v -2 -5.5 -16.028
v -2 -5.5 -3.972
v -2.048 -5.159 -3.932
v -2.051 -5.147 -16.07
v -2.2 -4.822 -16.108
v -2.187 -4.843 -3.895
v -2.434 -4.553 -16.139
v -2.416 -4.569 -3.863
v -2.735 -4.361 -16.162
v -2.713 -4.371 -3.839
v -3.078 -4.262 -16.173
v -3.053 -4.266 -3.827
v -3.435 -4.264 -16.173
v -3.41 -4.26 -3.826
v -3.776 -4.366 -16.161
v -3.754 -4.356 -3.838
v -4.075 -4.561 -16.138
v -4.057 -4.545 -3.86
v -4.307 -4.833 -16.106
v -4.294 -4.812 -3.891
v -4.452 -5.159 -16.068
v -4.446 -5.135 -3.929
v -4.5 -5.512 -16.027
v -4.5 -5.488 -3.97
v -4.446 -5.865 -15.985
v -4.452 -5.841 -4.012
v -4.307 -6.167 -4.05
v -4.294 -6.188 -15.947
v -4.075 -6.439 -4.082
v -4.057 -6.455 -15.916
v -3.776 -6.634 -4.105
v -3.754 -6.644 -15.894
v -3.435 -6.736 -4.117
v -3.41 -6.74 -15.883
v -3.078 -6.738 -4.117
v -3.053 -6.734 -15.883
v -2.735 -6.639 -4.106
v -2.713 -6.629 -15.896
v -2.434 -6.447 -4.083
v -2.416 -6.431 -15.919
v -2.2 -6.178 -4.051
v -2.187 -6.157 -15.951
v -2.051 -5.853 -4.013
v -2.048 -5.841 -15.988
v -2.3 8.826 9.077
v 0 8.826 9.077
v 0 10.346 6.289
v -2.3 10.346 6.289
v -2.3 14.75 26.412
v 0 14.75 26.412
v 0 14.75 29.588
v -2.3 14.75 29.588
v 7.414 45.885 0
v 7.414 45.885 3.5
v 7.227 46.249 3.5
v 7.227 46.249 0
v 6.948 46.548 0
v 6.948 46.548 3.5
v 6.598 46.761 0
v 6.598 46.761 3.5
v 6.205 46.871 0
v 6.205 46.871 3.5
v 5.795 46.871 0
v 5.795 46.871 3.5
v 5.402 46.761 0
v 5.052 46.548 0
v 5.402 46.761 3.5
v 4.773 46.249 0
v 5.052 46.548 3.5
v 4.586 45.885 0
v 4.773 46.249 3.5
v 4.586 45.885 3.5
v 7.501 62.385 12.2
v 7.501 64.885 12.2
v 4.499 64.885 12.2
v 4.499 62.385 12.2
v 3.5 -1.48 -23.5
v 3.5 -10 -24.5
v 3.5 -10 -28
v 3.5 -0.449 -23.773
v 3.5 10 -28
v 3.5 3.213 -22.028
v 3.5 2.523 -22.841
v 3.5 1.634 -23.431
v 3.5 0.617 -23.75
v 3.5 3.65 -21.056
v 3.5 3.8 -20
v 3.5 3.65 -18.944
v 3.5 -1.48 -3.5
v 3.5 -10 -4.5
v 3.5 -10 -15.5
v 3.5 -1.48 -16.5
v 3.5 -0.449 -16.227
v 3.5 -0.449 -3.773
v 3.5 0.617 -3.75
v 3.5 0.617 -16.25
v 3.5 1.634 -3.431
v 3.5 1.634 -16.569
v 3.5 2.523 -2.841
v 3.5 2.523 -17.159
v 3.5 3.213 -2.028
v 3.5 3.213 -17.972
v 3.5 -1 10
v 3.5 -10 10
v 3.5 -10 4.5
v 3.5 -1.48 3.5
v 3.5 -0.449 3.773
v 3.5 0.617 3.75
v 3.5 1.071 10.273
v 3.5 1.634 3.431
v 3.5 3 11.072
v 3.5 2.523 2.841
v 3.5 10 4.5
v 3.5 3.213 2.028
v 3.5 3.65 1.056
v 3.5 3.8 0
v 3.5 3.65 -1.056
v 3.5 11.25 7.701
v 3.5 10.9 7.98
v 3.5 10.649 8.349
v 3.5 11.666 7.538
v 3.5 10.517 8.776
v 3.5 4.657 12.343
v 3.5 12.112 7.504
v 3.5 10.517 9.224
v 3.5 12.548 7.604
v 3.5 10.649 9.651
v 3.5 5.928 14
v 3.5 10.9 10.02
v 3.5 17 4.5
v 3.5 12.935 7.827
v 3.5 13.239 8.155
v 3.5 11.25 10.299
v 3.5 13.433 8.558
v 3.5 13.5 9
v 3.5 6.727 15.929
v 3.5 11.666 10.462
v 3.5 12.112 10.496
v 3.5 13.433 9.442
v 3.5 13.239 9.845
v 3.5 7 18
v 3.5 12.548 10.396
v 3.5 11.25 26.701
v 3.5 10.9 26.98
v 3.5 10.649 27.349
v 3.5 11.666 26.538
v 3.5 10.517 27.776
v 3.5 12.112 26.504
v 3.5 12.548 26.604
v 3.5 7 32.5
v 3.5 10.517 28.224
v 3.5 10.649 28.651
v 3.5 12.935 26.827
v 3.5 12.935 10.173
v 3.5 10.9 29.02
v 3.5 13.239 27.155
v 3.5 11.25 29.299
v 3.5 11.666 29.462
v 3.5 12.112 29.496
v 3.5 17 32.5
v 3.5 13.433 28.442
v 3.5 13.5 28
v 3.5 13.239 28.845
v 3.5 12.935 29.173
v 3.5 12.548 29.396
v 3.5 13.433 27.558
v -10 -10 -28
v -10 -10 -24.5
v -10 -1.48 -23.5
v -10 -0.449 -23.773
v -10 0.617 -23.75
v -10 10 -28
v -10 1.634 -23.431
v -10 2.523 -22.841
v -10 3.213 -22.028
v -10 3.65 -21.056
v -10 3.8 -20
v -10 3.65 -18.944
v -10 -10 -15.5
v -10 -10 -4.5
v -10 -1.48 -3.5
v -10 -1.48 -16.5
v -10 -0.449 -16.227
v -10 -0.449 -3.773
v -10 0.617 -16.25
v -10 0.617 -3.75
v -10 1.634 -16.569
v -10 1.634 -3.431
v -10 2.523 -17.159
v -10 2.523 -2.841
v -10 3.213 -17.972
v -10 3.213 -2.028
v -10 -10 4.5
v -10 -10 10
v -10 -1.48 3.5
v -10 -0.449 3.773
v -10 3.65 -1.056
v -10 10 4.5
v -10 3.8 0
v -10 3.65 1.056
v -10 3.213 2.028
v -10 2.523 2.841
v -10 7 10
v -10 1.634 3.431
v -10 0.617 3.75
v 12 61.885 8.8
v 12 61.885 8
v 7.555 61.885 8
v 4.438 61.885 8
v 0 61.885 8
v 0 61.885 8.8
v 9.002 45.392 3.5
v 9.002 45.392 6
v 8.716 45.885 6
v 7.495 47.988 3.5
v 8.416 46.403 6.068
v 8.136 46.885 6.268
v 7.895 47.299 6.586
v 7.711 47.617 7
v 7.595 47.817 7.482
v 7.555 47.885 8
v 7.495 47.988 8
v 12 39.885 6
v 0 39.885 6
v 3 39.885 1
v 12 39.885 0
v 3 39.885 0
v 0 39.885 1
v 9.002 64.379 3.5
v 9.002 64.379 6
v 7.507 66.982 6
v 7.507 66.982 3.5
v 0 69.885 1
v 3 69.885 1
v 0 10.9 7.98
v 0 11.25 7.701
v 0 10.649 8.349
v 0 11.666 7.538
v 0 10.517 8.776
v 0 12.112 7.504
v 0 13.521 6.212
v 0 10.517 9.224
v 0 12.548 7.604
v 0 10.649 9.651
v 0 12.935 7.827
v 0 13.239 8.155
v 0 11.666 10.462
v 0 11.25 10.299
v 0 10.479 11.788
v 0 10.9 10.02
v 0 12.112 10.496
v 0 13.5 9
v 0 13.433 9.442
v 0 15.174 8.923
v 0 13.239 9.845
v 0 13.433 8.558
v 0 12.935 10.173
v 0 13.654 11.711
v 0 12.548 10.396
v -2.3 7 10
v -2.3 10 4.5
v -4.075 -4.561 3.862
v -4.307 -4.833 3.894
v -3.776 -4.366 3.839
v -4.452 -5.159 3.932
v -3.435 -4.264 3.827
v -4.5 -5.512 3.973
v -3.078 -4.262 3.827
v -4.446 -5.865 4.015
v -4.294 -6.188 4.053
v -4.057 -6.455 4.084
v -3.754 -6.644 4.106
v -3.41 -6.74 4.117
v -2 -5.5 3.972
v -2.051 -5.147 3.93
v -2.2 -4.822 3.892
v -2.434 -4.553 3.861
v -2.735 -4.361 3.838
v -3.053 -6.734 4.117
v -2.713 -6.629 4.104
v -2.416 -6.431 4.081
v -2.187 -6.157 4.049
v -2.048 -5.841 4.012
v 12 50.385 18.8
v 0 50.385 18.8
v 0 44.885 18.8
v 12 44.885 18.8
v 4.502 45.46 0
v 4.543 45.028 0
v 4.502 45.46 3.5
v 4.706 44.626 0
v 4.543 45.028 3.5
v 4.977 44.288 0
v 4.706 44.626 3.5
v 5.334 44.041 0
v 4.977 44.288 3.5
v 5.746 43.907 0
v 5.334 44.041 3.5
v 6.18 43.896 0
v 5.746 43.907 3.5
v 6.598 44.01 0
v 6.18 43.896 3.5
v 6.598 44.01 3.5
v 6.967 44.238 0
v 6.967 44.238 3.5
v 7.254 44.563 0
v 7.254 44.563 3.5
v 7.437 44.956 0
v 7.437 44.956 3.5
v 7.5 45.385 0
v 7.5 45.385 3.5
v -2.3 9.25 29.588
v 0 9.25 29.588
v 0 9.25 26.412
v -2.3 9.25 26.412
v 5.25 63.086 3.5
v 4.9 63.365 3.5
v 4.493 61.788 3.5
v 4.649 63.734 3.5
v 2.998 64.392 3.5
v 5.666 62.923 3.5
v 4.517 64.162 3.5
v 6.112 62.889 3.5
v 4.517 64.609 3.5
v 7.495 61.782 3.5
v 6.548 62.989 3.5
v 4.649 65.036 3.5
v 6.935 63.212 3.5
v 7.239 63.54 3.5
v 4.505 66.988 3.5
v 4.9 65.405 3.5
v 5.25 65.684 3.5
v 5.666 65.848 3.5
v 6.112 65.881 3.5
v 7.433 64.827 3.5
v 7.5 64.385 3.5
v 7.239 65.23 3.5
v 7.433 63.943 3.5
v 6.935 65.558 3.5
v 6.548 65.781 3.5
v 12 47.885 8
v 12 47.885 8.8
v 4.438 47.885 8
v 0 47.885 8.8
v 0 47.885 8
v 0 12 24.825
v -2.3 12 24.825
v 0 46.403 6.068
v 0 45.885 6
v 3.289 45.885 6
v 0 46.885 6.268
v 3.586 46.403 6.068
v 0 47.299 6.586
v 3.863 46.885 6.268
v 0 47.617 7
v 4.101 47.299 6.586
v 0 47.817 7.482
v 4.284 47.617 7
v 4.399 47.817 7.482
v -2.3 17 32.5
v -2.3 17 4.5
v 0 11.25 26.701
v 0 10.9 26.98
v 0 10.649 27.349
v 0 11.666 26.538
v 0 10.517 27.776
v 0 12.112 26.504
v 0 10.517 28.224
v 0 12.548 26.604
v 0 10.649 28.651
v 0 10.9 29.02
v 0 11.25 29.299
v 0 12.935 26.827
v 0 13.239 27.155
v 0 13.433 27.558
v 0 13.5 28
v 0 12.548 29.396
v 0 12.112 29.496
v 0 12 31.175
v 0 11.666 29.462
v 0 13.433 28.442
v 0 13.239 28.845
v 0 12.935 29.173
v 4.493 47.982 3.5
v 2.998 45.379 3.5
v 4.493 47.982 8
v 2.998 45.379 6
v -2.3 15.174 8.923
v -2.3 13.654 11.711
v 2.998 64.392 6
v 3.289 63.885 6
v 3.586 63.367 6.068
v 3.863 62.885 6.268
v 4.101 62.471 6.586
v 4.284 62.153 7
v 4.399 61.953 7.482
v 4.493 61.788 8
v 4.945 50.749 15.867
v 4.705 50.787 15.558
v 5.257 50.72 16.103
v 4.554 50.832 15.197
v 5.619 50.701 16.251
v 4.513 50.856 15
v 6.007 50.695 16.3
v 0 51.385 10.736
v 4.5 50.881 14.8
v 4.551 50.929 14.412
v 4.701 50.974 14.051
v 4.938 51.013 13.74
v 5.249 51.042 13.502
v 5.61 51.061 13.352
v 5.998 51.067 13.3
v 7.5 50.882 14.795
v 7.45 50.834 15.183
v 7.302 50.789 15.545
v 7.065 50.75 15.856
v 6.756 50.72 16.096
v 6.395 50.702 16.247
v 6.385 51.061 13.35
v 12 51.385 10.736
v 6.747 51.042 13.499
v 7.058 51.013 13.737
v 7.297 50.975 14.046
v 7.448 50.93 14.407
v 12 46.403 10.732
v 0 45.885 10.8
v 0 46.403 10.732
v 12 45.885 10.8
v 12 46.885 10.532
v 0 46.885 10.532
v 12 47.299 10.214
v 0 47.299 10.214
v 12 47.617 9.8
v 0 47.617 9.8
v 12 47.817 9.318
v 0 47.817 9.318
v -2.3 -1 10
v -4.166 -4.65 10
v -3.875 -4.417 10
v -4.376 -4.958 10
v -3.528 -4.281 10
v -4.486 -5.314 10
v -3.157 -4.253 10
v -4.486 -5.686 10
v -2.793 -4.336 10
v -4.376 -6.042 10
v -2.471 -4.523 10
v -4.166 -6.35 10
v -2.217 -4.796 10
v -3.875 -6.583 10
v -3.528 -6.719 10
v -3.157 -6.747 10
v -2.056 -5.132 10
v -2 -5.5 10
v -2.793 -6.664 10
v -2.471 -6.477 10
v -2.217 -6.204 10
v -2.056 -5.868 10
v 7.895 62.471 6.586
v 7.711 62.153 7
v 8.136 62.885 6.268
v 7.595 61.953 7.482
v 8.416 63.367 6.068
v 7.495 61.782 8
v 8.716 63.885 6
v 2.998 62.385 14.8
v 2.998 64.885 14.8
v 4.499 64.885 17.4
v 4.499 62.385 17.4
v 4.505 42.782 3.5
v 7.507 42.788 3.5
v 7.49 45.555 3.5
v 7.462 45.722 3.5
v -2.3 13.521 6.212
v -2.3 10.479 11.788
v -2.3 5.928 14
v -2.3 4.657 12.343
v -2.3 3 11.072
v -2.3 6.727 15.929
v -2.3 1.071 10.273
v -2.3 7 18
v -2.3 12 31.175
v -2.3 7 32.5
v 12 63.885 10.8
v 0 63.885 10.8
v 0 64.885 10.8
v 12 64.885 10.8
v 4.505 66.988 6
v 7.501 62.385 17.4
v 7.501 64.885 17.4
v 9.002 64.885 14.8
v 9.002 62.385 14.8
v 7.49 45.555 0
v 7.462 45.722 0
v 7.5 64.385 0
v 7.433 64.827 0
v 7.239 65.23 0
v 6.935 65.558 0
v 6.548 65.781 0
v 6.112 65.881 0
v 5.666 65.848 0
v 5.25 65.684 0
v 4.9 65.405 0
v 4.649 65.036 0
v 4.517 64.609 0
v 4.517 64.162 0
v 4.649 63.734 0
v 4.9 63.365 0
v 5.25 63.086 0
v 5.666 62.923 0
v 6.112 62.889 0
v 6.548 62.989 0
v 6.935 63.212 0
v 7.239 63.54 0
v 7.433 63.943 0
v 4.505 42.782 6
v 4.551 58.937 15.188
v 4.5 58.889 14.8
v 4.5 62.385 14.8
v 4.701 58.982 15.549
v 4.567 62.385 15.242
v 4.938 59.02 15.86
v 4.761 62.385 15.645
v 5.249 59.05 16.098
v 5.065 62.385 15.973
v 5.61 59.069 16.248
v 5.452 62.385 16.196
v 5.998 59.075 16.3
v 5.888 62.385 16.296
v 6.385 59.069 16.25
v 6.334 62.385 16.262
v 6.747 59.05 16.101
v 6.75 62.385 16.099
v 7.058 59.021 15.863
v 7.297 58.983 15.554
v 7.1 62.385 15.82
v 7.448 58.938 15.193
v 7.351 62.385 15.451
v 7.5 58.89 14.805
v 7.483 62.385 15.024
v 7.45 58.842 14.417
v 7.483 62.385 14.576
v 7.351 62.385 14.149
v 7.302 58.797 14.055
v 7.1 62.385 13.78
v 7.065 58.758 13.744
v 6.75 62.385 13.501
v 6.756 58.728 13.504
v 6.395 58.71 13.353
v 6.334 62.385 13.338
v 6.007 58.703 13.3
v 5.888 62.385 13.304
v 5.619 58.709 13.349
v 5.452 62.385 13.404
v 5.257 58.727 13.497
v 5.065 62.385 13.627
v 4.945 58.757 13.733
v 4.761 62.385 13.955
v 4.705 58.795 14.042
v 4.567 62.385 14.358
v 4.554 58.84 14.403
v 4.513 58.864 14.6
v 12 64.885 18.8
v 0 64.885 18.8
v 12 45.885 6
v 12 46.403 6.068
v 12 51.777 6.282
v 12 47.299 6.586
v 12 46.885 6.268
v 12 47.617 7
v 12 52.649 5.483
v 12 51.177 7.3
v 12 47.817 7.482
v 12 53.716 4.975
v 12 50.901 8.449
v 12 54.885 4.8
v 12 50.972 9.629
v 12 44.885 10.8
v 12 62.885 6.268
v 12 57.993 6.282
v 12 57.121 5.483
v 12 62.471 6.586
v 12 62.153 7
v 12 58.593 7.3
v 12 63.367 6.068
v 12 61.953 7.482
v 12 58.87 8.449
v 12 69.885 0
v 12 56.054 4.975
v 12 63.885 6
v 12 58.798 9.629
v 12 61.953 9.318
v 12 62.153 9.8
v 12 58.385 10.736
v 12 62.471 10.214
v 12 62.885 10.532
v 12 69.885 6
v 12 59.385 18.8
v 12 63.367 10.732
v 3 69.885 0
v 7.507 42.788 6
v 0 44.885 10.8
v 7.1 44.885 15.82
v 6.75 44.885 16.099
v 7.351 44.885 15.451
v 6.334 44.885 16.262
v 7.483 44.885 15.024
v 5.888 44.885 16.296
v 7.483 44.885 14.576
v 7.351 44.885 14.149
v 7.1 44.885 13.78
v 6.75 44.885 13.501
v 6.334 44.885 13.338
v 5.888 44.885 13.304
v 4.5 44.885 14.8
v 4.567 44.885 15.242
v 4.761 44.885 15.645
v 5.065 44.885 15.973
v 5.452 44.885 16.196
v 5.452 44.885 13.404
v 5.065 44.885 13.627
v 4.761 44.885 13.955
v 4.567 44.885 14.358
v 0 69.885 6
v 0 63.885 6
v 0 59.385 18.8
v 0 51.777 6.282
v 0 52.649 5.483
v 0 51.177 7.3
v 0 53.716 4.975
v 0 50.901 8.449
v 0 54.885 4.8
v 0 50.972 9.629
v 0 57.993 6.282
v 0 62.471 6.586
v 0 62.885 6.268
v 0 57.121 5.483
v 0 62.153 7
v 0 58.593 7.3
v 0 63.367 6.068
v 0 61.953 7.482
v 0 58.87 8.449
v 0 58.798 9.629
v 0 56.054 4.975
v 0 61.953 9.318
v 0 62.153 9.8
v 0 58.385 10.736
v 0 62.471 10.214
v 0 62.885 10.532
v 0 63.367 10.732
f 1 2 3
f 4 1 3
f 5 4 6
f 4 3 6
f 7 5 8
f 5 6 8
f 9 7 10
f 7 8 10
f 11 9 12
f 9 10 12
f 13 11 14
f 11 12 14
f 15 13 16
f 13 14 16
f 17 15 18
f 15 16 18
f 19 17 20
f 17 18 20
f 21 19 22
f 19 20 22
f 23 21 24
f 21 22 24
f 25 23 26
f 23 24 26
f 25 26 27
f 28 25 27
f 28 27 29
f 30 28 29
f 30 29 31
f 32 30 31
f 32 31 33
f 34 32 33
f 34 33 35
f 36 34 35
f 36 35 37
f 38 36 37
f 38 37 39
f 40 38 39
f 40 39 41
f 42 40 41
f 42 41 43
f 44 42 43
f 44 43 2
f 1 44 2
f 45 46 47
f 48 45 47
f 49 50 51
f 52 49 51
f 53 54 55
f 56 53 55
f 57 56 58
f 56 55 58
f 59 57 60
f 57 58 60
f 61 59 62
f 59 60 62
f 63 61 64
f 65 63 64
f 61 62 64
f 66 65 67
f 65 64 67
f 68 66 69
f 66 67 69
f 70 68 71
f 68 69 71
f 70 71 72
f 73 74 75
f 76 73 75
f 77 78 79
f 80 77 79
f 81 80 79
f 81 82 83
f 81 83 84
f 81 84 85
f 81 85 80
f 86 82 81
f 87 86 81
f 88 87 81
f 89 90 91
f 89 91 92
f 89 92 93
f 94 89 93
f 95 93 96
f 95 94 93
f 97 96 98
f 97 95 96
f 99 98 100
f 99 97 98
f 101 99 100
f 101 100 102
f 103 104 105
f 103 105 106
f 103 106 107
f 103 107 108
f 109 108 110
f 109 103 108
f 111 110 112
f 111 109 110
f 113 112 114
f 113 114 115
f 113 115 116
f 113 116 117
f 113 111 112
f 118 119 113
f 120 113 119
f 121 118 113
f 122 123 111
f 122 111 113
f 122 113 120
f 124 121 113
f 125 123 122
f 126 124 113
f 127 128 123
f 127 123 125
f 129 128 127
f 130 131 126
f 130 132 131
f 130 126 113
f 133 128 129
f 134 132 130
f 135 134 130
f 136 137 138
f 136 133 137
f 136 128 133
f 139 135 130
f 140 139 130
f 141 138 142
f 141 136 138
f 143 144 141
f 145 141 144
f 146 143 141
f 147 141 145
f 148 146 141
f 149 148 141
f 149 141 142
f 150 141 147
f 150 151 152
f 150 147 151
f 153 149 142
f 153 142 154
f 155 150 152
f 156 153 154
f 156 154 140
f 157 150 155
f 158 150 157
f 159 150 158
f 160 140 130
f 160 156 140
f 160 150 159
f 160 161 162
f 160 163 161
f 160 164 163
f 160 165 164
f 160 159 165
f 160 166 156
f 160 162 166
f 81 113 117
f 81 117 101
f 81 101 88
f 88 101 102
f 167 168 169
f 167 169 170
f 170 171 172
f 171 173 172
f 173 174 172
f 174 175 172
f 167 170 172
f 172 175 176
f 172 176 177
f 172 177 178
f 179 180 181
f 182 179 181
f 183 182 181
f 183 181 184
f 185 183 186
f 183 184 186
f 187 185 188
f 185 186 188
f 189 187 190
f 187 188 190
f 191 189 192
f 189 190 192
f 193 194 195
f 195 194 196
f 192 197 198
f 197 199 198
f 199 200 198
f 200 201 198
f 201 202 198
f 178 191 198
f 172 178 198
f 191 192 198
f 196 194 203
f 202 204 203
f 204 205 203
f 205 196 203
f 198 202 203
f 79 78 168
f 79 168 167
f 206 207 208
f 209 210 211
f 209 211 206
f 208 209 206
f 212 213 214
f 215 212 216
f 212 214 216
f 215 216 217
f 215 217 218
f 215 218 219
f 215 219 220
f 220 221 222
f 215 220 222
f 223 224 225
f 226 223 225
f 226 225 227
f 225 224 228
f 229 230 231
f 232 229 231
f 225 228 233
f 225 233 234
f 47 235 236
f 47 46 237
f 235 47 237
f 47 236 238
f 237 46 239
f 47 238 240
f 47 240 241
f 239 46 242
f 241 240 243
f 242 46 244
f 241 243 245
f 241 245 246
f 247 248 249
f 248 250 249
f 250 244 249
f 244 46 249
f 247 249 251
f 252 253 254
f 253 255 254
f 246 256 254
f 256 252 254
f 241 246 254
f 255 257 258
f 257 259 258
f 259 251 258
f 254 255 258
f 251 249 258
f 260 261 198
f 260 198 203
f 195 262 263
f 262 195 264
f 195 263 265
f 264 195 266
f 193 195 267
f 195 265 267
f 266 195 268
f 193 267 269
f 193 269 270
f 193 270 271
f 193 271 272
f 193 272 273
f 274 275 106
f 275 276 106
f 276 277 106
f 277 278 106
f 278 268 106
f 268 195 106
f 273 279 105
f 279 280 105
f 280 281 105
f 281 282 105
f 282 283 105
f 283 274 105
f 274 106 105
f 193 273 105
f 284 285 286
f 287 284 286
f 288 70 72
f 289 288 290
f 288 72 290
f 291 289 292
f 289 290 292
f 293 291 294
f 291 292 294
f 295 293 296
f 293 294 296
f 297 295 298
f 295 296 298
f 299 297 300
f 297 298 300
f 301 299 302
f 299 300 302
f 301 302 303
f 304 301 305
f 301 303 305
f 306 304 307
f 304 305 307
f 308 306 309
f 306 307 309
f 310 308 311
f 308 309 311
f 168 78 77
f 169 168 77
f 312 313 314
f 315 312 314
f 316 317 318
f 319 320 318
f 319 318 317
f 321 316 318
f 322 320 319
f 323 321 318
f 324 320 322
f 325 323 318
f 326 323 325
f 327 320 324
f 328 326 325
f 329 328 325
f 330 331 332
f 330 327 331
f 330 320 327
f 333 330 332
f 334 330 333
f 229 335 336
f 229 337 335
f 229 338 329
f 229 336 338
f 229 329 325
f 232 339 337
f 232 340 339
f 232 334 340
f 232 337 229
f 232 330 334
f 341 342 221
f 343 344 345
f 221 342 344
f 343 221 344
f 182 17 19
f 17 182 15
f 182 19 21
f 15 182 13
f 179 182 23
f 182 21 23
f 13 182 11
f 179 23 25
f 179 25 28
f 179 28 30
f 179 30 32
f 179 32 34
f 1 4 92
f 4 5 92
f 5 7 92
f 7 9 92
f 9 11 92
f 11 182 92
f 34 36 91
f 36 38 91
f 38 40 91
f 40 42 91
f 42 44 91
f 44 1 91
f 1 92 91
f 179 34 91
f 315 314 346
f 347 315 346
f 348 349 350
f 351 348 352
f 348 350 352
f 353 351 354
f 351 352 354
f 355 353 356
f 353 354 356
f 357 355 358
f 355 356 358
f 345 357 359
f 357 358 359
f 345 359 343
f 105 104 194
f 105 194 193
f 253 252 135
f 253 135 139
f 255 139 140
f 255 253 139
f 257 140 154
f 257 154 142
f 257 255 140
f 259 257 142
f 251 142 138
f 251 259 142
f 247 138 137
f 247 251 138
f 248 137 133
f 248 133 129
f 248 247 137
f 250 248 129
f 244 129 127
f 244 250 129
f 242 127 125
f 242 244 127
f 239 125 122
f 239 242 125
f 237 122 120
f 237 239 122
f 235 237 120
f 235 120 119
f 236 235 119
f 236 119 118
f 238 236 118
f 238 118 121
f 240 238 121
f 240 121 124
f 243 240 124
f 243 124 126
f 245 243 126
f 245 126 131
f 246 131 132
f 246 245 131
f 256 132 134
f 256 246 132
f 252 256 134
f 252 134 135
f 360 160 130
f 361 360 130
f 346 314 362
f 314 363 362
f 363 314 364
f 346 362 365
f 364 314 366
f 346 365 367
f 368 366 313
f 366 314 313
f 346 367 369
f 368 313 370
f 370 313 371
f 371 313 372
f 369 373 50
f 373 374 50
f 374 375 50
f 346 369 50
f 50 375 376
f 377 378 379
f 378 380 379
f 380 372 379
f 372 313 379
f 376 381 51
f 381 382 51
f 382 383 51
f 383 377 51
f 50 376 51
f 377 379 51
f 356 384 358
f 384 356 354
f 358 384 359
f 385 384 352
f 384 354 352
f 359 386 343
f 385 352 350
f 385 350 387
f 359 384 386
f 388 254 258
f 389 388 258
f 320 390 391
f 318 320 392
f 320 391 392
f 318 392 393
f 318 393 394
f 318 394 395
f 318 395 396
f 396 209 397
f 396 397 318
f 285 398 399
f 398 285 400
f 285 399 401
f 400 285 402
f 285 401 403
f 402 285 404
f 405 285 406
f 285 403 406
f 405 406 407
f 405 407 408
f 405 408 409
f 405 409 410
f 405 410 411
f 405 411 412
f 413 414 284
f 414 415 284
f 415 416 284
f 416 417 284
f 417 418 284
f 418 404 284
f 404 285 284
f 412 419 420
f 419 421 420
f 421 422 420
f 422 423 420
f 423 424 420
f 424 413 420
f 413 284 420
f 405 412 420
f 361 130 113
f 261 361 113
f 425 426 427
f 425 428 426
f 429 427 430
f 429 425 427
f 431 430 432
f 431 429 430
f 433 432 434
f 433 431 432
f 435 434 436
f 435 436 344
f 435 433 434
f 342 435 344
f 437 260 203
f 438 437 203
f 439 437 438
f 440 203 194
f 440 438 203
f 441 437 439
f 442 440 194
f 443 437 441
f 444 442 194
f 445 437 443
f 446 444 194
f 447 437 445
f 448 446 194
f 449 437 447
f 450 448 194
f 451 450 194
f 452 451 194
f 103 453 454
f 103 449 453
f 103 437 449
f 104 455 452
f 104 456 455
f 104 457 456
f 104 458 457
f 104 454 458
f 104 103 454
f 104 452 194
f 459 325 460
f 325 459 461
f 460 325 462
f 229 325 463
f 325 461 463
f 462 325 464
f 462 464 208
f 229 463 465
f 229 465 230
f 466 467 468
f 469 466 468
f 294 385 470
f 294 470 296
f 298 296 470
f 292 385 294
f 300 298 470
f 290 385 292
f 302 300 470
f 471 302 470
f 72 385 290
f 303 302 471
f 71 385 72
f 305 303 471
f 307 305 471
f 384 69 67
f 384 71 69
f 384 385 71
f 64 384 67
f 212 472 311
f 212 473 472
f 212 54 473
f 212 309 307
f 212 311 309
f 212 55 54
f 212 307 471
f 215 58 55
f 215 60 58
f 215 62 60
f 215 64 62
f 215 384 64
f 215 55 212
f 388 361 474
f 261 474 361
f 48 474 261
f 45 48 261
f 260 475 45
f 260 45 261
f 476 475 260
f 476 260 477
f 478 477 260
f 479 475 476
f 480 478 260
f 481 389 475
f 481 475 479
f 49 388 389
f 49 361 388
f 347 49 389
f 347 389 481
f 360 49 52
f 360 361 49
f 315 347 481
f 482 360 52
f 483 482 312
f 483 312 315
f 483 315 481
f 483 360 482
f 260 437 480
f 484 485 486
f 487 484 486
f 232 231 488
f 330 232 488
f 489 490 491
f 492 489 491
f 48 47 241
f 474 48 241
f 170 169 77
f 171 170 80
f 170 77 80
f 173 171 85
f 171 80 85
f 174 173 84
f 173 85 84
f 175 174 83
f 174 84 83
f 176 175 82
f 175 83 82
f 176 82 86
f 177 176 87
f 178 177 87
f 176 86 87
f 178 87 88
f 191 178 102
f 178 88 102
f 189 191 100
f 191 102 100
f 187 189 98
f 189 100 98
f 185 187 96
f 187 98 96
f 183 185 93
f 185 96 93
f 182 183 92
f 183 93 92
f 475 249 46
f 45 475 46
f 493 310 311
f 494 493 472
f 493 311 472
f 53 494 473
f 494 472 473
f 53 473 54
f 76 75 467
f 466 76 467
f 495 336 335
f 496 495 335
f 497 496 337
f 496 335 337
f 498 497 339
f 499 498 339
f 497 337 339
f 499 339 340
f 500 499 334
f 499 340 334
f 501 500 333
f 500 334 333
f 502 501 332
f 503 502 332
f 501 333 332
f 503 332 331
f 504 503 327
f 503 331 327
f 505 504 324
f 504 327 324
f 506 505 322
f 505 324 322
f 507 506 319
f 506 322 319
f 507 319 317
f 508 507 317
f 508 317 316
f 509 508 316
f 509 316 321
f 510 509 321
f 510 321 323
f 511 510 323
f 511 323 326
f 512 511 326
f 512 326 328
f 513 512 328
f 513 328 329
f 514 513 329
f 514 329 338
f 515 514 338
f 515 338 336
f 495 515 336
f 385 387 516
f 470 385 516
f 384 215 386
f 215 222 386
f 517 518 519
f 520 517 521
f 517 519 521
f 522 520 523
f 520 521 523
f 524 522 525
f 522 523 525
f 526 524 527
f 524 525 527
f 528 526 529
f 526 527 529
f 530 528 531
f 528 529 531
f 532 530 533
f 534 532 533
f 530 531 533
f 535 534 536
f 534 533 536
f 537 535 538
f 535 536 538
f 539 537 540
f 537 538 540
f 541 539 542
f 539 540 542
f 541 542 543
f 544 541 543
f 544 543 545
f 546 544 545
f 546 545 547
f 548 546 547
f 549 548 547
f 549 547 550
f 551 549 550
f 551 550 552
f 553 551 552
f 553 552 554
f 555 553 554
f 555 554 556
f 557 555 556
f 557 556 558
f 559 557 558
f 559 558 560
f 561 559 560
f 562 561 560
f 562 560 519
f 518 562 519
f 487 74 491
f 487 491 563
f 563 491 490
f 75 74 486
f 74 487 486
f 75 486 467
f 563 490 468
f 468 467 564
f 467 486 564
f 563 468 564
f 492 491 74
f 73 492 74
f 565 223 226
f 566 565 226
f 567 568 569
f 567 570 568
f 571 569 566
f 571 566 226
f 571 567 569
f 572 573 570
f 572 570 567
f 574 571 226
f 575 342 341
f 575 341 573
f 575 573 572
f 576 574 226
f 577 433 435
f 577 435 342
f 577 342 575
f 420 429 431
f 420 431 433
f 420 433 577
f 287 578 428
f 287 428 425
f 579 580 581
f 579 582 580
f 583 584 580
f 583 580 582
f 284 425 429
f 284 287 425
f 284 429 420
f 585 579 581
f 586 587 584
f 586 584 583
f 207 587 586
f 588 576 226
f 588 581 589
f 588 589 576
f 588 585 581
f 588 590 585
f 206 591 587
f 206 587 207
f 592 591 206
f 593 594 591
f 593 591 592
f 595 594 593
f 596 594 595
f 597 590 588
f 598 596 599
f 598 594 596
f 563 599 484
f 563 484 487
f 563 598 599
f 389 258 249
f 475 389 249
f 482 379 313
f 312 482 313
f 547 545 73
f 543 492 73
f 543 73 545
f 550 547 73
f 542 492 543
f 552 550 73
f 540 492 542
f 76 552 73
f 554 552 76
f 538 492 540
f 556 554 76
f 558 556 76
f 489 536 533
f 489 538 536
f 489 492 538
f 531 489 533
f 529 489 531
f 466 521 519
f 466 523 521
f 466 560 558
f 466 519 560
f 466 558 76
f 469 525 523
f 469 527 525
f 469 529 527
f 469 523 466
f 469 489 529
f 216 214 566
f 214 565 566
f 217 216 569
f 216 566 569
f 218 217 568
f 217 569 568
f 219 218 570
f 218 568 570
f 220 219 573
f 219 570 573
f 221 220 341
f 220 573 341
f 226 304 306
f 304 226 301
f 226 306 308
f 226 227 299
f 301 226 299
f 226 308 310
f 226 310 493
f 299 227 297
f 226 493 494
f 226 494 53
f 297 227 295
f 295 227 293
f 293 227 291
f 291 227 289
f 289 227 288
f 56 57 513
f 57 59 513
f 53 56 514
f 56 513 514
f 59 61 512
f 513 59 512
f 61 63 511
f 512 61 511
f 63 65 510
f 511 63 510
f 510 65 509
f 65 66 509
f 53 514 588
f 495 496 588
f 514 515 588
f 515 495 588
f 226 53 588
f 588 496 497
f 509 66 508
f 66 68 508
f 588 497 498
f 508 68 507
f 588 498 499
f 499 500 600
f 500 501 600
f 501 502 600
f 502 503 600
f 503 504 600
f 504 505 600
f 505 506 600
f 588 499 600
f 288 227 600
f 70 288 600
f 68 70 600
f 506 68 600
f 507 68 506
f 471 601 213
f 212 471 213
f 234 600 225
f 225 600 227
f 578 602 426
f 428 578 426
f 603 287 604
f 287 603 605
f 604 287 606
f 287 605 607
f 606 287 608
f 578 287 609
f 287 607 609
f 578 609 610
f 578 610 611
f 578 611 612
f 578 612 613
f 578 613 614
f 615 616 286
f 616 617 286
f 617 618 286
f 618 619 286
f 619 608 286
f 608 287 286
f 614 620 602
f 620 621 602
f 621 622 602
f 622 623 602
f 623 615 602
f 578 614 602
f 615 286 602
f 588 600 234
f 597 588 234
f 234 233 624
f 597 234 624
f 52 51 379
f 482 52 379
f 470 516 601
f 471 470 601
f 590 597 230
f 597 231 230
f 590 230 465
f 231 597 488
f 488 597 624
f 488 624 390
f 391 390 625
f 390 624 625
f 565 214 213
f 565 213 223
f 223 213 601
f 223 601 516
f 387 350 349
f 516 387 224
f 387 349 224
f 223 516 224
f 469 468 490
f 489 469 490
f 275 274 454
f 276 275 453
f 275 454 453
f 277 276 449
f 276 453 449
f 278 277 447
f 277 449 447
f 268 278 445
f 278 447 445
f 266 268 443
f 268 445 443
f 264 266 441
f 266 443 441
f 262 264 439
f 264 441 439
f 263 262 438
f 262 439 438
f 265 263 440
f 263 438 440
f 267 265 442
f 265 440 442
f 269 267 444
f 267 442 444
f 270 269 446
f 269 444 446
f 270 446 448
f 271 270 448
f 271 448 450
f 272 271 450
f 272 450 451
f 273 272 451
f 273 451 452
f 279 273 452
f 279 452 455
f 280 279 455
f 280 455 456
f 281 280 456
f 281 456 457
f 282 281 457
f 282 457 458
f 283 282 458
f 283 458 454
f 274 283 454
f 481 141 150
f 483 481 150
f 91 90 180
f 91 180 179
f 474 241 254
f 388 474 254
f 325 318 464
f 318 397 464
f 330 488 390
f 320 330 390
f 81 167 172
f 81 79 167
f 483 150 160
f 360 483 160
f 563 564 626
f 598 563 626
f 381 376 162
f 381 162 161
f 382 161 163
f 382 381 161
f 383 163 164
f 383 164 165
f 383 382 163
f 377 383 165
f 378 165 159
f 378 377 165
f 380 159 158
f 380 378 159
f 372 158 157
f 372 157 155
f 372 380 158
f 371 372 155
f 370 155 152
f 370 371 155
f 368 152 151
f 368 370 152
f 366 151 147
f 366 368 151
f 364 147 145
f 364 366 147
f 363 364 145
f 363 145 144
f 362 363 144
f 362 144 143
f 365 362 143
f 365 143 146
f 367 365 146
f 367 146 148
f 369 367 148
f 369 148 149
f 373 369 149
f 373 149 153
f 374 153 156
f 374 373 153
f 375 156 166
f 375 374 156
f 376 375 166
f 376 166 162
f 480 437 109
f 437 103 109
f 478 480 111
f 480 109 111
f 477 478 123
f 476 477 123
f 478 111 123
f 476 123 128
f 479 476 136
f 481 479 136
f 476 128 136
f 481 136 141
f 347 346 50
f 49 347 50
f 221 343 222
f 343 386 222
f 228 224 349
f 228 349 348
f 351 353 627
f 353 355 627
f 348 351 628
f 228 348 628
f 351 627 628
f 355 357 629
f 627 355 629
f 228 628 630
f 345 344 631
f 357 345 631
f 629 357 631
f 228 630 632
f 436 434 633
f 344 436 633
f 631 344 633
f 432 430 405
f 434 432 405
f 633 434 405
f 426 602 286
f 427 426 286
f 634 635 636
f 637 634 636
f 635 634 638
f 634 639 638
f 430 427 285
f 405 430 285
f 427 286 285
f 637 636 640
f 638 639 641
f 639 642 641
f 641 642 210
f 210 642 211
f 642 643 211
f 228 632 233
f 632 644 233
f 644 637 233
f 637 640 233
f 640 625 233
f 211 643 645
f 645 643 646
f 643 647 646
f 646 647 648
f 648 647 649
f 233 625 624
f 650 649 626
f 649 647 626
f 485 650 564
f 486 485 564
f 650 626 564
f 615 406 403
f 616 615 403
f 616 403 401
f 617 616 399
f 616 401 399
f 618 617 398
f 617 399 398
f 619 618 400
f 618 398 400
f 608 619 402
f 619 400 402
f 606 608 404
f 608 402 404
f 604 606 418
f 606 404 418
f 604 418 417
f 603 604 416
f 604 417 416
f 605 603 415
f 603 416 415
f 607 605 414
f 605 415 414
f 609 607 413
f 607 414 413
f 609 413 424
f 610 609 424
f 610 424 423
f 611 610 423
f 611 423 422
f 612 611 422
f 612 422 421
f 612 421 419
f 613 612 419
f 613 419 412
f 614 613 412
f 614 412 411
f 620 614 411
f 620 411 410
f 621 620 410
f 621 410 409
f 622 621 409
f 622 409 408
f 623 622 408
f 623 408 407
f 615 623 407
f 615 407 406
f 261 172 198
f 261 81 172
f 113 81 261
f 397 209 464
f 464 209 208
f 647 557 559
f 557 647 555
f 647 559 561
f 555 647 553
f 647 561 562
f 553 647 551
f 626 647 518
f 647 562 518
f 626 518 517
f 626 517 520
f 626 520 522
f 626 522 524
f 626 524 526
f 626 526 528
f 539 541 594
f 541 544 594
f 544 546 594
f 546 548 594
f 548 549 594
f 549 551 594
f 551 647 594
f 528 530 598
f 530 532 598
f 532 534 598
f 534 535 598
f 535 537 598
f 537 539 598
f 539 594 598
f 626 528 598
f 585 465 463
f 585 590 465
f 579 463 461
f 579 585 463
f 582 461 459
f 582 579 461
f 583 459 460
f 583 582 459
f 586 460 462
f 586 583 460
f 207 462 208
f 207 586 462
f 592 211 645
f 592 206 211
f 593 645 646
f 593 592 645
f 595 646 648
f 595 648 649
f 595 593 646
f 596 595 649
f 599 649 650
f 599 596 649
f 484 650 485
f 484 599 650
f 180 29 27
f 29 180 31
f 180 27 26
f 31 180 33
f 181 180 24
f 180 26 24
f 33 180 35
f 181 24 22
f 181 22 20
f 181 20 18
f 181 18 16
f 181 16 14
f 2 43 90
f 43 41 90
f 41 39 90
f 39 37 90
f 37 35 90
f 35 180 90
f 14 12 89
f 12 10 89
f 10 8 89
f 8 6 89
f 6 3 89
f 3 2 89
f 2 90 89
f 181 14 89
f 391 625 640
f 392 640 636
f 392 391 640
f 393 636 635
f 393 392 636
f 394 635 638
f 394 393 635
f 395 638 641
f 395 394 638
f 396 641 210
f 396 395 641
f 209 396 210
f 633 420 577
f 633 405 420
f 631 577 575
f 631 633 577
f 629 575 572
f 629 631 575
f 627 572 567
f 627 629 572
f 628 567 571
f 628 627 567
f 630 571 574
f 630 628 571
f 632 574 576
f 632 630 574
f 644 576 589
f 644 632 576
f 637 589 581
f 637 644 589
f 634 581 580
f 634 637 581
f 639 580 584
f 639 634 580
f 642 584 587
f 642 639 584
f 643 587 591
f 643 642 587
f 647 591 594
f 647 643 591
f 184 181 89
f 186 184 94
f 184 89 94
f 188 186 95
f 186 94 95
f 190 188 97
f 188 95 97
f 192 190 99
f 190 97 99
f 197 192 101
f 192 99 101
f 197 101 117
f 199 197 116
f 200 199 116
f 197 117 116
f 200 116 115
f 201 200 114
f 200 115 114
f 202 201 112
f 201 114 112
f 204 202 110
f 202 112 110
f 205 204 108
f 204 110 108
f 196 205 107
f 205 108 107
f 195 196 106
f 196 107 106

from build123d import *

# Parameters (mm, degrees)
F0_R           = 3.8
F0_R_2         = 1.5
F1_DEPTH       = 3.5
F3_DEPTH       = 2.3
F4_DEPTH       = 10
F6_DEPTH       = 13.501
F7_R           = 1.25
F8_DEPTH       = 30
F9_R           = 4
F10_DEPTH      = 12
F11_R          = 2
F12_R          = 1.5
F13_DEPTH      = 34.001
F13_DEPTH_BACK = 3
F14_DEPTH      = 2.5
F14_DEPTH_BACK = 2
F16_DEPTH      = 22.001
F17_R          = 1.5
F18_DEPTH      = 74.8861283789
F19_DEPTH      = 2.5
F20_R          = 2
F21_W          = 3
F21_H          = 30
F22_DEPTH      = 1


with BuildPart() as f1:
    # F0 (on Right) → F1 (new body)
    with BuildSketch(Plane.YZ):
        with BuildLine():
            Line((17, 32.5), (7, 32.5))
            Line((7, 32.5), (7, 18))
            ThreePointArc((7, 18), (4.6568542495, 12.3431457505), (-1, 10))
            Line((-1, 10), (-10, 10))
            Line((-10, 10), (-10, -28))
            Line((-10, -28), (10, -28))
            Line((10, -28), (10, 4.5))
            Line((10, 4.5), (17, 4.5))
            Line((17, 4.5), (17, 32.5))
        make_face()
        with Locations((0, -20)):
            Circle(F0_R, mode=Mode.SUBTRACT)
        Circle(F0_R, mode=Mode.SUBTRACT)
        with Locations((12, 9)):
            Circle(F0_R_2, mode=Mode.SUBTRACT)
        with Locations((12, 28)):
            Circle(F0_R_2, mode=Mode.SUBTRACT)
    extrude(amount=F1_DEPTH)

    # F2 (on face) → F3 (join)
    with BuildSketch(Plane(origin=(0, 0, 0), x_dir=(0, -1, 0), z_dir=(-1, 0, 0))):
        with BuildLine():
            Line((-17, 4.5), (-10, 4.5))
            Line((-10, 4.5), (-7, 10))
            Line((-7, 10), (1, 10))
            ThreePointArc((1, 10), (-4.6568542495, 12.3431457505), (-7, 18))
            Line((-7, 18), (-7, 32.5))
            Line((-7, 32.5), (-17, 32.5))
            Line((-17, 32.5), (-17, 4.5))
        make_face()
        Polygon((-10.479440264, 11.7876928494), (-8.8255073065, 9.0770030653), (-10.3460670425, 6.2893102159), (-13.520559736, 6.2123071506), (-15.1744926935, 8.9229969347), (-13.6539329575, 11.7106897841), align=None, mode=Mode.SUBTRACT)
        Polygon((-12, 31.1754264805), (-9.25, 29.5877132403), (-9.25, 26.4122867597), (-12, 24.8245735195), (-14.75, 26.4122867597), (-14.75, 29.5877132403), align=None, mode=Mode.SUBTRACT)
    extrude(amount=F3_DEPTH)

    # F4 (add): a face of the model
    f4_faces = [f1.faces().sort_by_distance(p)[0] for p in [
        (0, -0.112326268, -9.0769957675),
    ]]
    extrude(f4_faces, amount=F4_DEPTH)

    # F5 (on face) → F6 (cut, through all)
    with BuildSketch(Plane.YZ.offset(3.5)):
        with BuildLine():
            ThreePointArc((-1.4798648587, -3.5), (2.0995849039, -3.1672927291), (3.8, 0))
            ThreePointArc((3.8, 0), (2.0995849039, 3.1672927291), (-1.4798648587, 3.5))
            Line((-1.4798648587, 3.5), (-1.4798648587, -3.5))
        make_face()
        with BuildLine():
            Line((-1.4798648587, -3.5), (-1.4798648587, 3.5))
            ThreePointArc((-1.4798648587, 3.5), (-3.8, 0), (-1.4798648587, -3.5))
        make_face()
        with BuildLine():
            ThreePointArc((-1.4798648587, -3.5), (-3.8, 0), (-1.4798648587, 3.5))
            Line((-1.4798648587, 3.5), (-10, 4.5))
            Line((-10, 4.5), (-10, -4.5))
            Line((-10, -4.5), (-1.4798648587, -3.5))
        make_face()
        with BuildLine():
            ThreePointArc((-1.4798648587, -23.5), (2.0995849039, -23.1672927291), (3.8, -20))
            ThreePointArc((3.8, -20), (2.0995849039, -16.8327072709), (-1.4798648587, -16.5))
            Line((-1.4798648587, -16.5), (-1.4798648587, -23.5))
        make_face()
        with BuildLine():
            Line((-1.4798648587, -23.5), (-1.4798648587, -16.5))
            ThreePointArc((-1.4798648587, -16.5), (-3.8, -20), (-1.4798648587, -23.5))
        make_face()
        with BuildLine():
            ThreePointArc((-1.4798648587, -23.5), (-3.8, -20), (-1.4798648587, -16.5))
            Line((-1.4798648587, -16.5), (-10, -15.5))
            Line((-10, -15.5), (-10, -24.5))
            Line((-10, -24.5), (-1.4798648587, -23.5))
        make_face()
    extrude(amount=-F6_DEPTH, mode=Mode.SUBTRACT)

    # F7 (on face) → F8 (cut)
    with BuildSketch(Plane.XY.offset(10)):
        with Locations((-3.25, -5.5)):
            Circle(F7_R)
    extrude(amount=-F8_DEPTH, mode=Mode.SUBTRACT)


with BuildPart() as f10:
    # F9 (on Right) → F10 (new body)
    with BuildSketch(Plane.YZ):
        Polygon((39.8851283789, 0), (69.8851283789, 0), (69.8851283789, 6), (61.8851283789, 6), (61.8851283789, 10.8), (64.8851283789, 10.8), (64.8851283789, 18.8), (44.8851283789, 18.8), (44.8851283789, 10.8), (47.8851283789, 10.8), (47.8851283789, 6), (39.8851283789, 6), align=None)
        with Locations((54.8851283789, 8.8)):
            Circle(F9_R, mode=Mode.SUBTRACT)
    extrude(amount=F10_DEPTH)

    # F11
    f11_edges = [f10.edges().sort_by_distance(p)[0] for p in [
        (6, 47.885128, 6),
        (6, 61.885128, 6),
    ]]
    fillet(f11_edges, radius=F11_R)

    # F12 (on face) → F13 (cut, two sides)
    with BuildSketch(Plane.XY.offset(6)) as f13_sk:
        with BuildLine():
            Line((4.5857864376, 45.8851283789), (7.4142135624, 45.8851283789))
            ThreePointArc((7.4142135624, 45.8851283789), (6, 46.8851283789), (4.5857864376, 45.8851283789))
        make_face()
        with BuildLine():
            ThreePointArc((4.5857864376, 45.8851283789), (5.7463470319, 43.9067305394), (7.5, 45.3851283789))
            ThreePointArc((7.5, 45.3851283789), (7.4783978395, 45.638781347), (7.4142135624, 45.8851283789))
            Line((7.4142135624, 45.8851283789), (4.5857864376, 45.8851283789))
        make_face()
        with Locations((6, 64.3851283789)):
            Circle(F12_R)
    extrude(amount=-F13_DEPTH, mode=Mode.SUBTRACT)
    extrude(f13_sk.sketch, amount=F13_DEPTH_BACK, mode=Mode.SUBTRACT)

    # F12 (on face) → F14 (cut, two sides)
    with BuildSketch(Plane.XY.offset(6)) as f14_sk:
        Polygon((7.5067365177, 42.7883845718), (9.0022143629, 45.3916285765), (7.4954778452, 47.9883723835), (4.4932634823, 47.9818721859), (2.9977856371, 45.3786281813), (4.5045221548, 42.7818843742), align=None)
        with Locations((6, 45.3851283789)):
            Circle(F12_R, mode=Mode.SUBTRACT)
        Polygon((4.5045221548, 66.9883723835), (2.9977856371, 64.3916285765), (4.4932634823, 61.7883845718), (7.4954778452, 61.7818843742), (9.0022143629, 64.3786281813), (7.5067365177, 66.9818721859), align=None)
        with Locations((6, 64.3851283789)):
            Circle(F12_R, mode=Mode.SUBTRACT)
    extrude(amount=-F14_DEPTH, mode=Mode.SUBTRACT)
    extrude(f14_sk.sketch, amount=F14_DEPTH_BACK, mode=Mode.SUBTRACT)

    # F15 (on face) → F16 (cut, through all)
    with BuildSketch(Plane.YZ.offset(12)):
        with BuildLine():
            ThreePointArc((51.3851283789, 10.7364916731), (54.8851283789, 12.8), (58.3851283789, 10.7364916731))
            Line((58.3851283789, 10.7364916731), (59.3851283789, 18.8))
            Line((59.3851283789, 18.8), (50.3851283789, 18.8))
            Line((50.3851283789, 18.8), (51.3851283789, 10.7364916731))
        make_face()
    extrude(amount=-F16_DEPTH, mode=Mode.SUBTRACT)

    # F17 (on face) → F18 (cut, through all)
    with BuildSketch(Plane(origin=(0, 64.8851283789, 0), x_dir=(-1, 0, 0), z_dir=(0, 1, 0))):
        with Locations((-6, 14.8)):
            Circle(F17_R)
    extrude(amount=-F18_DEPTH, mode=Mode.SUBTRACT)

    # F17 (on face) → F19 (cut)
    with BuildSketch(Plane(origin=(0, 64.8851283789, 0), x_dir=(-1, 0, 0), z_dir=(0, 1, 0))):
        Polygon((-4.4988893001, 17.4), (-7.5011106999, 17.4), (-9.0022213998, 14.8), (-7.5011106999, 12.2), (-4.4988893001, 12.2), (-2.9977786002, 14.8), align=None)
        with Locations((-6, 14.8)):
            Circle(F17_R, mode=Mode.SUBTRACT)
    extrude(amount=-F19_DEPTH, mode=Mode.SUBTRACT)

    # F20
    f20_edges = [f10.edges().sort_by_distance(p)[0] for p in [
        (6, 61.885128, 10.8),
        (6, 47.885128, 10.8),
    ]]
    fillet(f20_edges, radius=F20_R)

    # F21 (on face) → F22 (cut)
    with BuildSketch(Plane(origin=(0, 0, 0), x_dir=(1, 0, 0), z_dir=(0, 0, -1))):
        with Locations((1.5, -54.8851283789)):
            Rectangle(F21_W, F21_H)
    extrude(amount=-F22_DEPTH, mode=Mode.SUBTRACT)


solid = Compound([f1.part, f10.part])
